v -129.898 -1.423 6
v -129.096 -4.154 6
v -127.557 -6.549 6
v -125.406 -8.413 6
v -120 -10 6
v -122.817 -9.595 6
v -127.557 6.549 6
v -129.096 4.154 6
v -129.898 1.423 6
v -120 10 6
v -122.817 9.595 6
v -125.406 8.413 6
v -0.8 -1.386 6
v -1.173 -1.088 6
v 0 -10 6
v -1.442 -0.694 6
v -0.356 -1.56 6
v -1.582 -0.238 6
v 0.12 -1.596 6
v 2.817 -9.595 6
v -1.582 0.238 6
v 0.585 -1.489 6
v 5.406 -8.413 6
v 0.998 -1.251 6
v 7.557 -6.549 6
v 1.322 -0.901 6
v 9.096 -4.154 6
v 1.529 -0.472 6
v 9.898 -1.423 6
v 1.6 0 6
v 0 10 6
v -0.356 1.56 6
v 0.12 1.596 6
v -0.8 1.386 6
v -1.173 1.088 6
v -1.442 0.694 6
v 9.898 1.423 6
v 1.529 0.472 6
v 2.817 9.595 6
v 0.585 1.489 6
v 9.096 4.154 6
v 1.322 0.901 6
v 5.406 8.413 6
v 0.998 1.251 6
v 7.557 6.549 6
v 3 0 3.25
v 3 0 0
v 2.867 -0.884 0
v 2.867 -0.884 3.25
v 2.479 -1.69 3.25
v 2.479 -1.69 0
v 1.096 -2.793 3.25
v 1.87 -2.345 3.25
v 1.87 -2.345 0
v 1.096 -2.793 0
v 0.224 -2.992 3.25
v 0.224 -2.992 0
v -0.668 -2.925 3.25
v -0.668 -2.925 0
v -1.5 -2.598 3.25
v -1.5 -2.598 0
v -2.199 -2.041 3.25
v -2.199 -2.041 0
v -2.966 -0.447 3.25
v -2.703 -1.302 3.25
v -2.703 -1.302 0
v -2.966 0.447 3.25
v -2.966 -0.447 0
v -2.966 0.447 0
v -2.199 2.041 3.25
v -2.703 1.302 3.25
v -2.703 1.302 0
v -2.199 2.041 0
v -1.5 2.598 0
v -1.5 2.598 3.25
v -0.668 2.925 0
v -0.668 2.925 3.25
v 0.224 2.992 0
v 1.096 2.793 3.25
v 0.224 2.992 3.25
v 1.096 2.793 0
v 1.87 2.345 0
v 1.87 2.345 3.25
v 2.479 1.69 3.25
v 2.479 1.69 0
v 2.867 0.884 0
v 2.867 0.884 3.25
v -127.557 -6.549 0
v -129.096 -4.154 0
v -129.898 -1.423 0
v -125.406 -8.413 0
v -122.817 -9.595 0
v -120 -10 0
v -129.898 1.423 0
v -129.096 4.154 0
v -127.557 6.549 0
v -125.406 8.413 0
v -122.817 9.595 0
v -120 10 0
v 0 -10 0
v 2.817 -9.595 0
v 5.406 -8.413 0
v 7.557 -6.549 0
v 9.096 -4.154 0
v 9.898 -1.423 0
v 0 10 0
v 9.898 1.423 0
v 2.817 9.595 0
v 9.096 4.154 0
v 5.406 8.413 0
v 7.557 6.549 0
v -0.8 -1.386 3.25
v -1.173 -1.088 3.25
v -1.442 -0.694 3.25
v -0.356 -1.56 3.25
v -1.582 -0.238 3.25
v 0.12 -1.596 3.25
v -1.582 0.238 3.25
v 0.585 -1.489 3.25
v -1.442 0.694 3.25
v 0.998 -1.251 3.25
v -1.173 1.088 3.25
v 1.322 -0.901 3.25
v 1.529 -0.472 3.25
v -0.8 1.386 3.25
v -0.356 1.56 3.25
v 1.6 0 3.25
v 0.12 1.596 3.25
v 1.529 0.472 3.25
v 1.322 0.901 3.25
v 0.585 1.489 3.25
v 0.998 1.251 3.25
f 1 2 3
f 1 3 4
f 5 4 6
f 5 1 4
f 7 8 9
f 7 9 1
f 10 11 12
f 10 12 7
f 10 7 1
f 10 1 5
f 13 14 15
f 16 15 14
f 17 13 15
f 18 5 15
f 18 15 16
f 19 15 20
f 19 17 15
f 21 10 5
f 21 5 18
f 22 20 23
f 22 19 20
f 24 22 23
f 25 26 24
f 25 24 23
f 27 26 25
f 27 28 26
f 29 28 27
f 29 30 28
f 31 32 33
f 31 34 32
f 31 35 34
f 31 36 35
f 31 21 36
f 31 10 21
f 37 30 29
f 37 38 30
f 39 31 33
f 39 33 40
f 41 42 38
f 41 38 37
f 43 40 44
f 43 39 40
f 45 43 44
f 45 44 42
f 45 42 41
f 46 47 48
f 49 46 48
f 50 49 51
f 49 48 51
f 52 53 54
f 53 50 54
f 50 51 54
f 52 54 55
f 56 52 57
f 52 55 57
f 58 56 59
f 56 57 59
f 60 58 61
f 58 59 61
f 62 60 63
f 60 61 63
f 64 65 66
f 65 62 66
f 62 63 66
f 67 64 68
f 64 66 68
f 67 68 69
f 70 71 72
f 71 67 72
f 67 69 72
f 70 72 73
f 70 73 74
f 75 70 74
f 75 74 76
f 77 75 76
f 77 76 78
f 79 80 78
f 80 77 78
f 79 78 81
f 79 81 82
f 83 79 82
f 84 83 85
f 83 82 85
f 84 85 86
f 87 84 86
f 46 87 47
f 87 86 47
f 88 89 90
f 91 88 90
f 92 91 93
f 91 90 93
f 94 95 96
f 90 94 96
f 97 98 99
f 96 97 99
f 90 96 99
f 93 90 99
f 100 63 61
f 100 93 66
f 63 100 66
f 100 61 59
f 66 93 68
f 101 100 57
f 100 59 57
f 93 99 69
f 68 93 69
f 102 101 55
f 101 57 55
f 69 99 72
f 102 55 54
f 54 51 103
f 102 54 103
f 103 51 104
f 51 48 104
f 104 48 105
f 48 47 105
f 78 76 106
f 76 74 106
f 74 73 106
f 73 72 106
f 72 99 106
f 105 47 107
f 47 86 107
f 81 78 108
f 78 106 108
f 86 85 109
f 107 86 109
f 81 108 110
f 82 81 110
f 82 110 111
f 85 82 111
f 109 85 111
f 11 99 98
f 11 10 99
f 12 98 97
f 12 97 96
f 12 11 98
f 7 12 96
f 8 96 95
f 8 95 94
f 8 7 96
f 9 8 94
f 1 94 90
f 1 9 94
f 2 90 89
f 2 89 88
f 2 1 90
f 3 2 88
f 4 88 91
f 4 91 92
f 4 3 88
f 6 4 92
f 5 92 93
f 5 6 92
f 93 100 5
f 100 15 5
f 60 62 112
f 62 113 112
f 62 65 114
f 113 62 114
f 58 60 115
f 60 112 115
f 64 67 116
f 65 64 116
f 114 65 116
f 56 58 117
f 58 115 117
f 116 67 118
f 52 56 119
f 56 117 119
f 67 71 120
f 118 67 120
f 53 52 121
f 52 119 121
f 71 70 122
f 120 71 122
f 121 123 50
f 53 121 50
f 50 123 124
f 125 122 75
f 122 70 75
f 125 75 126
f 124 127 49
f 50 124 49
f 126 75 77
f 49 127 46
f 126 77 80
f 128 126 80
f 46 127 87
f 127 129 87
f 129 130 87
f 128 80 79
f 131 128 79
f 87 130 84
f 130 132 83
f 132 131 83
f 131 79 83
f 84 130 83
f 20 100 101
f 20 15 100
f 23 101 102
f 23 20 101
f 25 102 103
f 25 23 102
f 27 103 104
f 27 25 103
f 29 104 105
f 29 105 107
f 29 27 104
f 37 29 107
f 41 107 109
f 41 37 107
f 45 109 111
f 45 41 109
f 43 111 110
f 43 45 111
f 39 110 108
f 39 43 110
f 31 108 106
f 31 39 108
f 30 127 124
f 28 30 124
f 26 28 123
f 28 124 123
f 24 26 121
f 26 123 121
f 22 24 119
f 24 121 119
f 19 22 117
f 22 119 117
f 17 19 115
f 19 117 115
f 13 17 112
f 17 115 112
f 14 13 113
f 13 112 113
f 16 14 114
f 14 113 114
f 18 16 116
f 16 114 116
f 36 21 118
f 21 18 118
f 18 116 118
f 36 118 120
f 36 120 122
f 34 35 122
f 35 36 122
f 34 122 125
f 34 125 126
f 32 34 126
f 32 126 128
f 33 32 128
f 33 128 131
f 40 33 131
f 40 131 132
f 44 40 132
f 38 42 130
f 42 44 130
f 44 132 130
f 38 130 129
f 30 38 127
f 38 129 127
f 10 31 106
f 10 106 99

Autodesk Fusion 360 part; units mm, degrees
sketch "Sketch4" plane through (0, 0, 0) normal (0, 0, 1) x (1, 0, 0)
  circle A0 centre (0, 0) radius 3
  circle A1 centre (0, 0) radius 6
  dimension "d9" = 6
  dimension "d10" = 3
extrude "Extrude2" add sketch "Sketch4" along normal blind 3.25
sketch "Sketch5" plane through (0, 0, 3.25) normal (0, 0, 1) x (1, 0, 0)
  circle A0 centre (0, 0) radius 3
  circle A1 centre (0, 0) radius 6
  circle A2 centre (0, 0) radius 1.6
  dimension "d13" = 3.2
extrude "Extrude3" add sketch "Sketch5" along normal blind 2.75 contours A0 | A1
sketch "Sketch8" plane through (0, 0, 6) normal (0, 0, 1) x (1, 0, 0)
  circle A0 centre (0, 0) radius 1.6
  circle A1 centre (0, 0) radius 6
  circle A2 centre (0, 0) radius 10
  line L0 (0, -10) -> (0, 10) construction
  line L1 (0, -10) -> (-120, -10)
  line L2 (0, 10) -> (-120, 10)
  circle A3 centre (-120, 0) radius 10
  line L3 (-120, -10) -> (-120, 10) construction
  dimension "d30" = 20
  dimension "d31" = 120
  dimension "d32" = 120
extrude "Extrude5" add sketch "Sketch8" against normal up to surface (6 mm away) contours A2 | A2 L1 L2 A3 | A3
